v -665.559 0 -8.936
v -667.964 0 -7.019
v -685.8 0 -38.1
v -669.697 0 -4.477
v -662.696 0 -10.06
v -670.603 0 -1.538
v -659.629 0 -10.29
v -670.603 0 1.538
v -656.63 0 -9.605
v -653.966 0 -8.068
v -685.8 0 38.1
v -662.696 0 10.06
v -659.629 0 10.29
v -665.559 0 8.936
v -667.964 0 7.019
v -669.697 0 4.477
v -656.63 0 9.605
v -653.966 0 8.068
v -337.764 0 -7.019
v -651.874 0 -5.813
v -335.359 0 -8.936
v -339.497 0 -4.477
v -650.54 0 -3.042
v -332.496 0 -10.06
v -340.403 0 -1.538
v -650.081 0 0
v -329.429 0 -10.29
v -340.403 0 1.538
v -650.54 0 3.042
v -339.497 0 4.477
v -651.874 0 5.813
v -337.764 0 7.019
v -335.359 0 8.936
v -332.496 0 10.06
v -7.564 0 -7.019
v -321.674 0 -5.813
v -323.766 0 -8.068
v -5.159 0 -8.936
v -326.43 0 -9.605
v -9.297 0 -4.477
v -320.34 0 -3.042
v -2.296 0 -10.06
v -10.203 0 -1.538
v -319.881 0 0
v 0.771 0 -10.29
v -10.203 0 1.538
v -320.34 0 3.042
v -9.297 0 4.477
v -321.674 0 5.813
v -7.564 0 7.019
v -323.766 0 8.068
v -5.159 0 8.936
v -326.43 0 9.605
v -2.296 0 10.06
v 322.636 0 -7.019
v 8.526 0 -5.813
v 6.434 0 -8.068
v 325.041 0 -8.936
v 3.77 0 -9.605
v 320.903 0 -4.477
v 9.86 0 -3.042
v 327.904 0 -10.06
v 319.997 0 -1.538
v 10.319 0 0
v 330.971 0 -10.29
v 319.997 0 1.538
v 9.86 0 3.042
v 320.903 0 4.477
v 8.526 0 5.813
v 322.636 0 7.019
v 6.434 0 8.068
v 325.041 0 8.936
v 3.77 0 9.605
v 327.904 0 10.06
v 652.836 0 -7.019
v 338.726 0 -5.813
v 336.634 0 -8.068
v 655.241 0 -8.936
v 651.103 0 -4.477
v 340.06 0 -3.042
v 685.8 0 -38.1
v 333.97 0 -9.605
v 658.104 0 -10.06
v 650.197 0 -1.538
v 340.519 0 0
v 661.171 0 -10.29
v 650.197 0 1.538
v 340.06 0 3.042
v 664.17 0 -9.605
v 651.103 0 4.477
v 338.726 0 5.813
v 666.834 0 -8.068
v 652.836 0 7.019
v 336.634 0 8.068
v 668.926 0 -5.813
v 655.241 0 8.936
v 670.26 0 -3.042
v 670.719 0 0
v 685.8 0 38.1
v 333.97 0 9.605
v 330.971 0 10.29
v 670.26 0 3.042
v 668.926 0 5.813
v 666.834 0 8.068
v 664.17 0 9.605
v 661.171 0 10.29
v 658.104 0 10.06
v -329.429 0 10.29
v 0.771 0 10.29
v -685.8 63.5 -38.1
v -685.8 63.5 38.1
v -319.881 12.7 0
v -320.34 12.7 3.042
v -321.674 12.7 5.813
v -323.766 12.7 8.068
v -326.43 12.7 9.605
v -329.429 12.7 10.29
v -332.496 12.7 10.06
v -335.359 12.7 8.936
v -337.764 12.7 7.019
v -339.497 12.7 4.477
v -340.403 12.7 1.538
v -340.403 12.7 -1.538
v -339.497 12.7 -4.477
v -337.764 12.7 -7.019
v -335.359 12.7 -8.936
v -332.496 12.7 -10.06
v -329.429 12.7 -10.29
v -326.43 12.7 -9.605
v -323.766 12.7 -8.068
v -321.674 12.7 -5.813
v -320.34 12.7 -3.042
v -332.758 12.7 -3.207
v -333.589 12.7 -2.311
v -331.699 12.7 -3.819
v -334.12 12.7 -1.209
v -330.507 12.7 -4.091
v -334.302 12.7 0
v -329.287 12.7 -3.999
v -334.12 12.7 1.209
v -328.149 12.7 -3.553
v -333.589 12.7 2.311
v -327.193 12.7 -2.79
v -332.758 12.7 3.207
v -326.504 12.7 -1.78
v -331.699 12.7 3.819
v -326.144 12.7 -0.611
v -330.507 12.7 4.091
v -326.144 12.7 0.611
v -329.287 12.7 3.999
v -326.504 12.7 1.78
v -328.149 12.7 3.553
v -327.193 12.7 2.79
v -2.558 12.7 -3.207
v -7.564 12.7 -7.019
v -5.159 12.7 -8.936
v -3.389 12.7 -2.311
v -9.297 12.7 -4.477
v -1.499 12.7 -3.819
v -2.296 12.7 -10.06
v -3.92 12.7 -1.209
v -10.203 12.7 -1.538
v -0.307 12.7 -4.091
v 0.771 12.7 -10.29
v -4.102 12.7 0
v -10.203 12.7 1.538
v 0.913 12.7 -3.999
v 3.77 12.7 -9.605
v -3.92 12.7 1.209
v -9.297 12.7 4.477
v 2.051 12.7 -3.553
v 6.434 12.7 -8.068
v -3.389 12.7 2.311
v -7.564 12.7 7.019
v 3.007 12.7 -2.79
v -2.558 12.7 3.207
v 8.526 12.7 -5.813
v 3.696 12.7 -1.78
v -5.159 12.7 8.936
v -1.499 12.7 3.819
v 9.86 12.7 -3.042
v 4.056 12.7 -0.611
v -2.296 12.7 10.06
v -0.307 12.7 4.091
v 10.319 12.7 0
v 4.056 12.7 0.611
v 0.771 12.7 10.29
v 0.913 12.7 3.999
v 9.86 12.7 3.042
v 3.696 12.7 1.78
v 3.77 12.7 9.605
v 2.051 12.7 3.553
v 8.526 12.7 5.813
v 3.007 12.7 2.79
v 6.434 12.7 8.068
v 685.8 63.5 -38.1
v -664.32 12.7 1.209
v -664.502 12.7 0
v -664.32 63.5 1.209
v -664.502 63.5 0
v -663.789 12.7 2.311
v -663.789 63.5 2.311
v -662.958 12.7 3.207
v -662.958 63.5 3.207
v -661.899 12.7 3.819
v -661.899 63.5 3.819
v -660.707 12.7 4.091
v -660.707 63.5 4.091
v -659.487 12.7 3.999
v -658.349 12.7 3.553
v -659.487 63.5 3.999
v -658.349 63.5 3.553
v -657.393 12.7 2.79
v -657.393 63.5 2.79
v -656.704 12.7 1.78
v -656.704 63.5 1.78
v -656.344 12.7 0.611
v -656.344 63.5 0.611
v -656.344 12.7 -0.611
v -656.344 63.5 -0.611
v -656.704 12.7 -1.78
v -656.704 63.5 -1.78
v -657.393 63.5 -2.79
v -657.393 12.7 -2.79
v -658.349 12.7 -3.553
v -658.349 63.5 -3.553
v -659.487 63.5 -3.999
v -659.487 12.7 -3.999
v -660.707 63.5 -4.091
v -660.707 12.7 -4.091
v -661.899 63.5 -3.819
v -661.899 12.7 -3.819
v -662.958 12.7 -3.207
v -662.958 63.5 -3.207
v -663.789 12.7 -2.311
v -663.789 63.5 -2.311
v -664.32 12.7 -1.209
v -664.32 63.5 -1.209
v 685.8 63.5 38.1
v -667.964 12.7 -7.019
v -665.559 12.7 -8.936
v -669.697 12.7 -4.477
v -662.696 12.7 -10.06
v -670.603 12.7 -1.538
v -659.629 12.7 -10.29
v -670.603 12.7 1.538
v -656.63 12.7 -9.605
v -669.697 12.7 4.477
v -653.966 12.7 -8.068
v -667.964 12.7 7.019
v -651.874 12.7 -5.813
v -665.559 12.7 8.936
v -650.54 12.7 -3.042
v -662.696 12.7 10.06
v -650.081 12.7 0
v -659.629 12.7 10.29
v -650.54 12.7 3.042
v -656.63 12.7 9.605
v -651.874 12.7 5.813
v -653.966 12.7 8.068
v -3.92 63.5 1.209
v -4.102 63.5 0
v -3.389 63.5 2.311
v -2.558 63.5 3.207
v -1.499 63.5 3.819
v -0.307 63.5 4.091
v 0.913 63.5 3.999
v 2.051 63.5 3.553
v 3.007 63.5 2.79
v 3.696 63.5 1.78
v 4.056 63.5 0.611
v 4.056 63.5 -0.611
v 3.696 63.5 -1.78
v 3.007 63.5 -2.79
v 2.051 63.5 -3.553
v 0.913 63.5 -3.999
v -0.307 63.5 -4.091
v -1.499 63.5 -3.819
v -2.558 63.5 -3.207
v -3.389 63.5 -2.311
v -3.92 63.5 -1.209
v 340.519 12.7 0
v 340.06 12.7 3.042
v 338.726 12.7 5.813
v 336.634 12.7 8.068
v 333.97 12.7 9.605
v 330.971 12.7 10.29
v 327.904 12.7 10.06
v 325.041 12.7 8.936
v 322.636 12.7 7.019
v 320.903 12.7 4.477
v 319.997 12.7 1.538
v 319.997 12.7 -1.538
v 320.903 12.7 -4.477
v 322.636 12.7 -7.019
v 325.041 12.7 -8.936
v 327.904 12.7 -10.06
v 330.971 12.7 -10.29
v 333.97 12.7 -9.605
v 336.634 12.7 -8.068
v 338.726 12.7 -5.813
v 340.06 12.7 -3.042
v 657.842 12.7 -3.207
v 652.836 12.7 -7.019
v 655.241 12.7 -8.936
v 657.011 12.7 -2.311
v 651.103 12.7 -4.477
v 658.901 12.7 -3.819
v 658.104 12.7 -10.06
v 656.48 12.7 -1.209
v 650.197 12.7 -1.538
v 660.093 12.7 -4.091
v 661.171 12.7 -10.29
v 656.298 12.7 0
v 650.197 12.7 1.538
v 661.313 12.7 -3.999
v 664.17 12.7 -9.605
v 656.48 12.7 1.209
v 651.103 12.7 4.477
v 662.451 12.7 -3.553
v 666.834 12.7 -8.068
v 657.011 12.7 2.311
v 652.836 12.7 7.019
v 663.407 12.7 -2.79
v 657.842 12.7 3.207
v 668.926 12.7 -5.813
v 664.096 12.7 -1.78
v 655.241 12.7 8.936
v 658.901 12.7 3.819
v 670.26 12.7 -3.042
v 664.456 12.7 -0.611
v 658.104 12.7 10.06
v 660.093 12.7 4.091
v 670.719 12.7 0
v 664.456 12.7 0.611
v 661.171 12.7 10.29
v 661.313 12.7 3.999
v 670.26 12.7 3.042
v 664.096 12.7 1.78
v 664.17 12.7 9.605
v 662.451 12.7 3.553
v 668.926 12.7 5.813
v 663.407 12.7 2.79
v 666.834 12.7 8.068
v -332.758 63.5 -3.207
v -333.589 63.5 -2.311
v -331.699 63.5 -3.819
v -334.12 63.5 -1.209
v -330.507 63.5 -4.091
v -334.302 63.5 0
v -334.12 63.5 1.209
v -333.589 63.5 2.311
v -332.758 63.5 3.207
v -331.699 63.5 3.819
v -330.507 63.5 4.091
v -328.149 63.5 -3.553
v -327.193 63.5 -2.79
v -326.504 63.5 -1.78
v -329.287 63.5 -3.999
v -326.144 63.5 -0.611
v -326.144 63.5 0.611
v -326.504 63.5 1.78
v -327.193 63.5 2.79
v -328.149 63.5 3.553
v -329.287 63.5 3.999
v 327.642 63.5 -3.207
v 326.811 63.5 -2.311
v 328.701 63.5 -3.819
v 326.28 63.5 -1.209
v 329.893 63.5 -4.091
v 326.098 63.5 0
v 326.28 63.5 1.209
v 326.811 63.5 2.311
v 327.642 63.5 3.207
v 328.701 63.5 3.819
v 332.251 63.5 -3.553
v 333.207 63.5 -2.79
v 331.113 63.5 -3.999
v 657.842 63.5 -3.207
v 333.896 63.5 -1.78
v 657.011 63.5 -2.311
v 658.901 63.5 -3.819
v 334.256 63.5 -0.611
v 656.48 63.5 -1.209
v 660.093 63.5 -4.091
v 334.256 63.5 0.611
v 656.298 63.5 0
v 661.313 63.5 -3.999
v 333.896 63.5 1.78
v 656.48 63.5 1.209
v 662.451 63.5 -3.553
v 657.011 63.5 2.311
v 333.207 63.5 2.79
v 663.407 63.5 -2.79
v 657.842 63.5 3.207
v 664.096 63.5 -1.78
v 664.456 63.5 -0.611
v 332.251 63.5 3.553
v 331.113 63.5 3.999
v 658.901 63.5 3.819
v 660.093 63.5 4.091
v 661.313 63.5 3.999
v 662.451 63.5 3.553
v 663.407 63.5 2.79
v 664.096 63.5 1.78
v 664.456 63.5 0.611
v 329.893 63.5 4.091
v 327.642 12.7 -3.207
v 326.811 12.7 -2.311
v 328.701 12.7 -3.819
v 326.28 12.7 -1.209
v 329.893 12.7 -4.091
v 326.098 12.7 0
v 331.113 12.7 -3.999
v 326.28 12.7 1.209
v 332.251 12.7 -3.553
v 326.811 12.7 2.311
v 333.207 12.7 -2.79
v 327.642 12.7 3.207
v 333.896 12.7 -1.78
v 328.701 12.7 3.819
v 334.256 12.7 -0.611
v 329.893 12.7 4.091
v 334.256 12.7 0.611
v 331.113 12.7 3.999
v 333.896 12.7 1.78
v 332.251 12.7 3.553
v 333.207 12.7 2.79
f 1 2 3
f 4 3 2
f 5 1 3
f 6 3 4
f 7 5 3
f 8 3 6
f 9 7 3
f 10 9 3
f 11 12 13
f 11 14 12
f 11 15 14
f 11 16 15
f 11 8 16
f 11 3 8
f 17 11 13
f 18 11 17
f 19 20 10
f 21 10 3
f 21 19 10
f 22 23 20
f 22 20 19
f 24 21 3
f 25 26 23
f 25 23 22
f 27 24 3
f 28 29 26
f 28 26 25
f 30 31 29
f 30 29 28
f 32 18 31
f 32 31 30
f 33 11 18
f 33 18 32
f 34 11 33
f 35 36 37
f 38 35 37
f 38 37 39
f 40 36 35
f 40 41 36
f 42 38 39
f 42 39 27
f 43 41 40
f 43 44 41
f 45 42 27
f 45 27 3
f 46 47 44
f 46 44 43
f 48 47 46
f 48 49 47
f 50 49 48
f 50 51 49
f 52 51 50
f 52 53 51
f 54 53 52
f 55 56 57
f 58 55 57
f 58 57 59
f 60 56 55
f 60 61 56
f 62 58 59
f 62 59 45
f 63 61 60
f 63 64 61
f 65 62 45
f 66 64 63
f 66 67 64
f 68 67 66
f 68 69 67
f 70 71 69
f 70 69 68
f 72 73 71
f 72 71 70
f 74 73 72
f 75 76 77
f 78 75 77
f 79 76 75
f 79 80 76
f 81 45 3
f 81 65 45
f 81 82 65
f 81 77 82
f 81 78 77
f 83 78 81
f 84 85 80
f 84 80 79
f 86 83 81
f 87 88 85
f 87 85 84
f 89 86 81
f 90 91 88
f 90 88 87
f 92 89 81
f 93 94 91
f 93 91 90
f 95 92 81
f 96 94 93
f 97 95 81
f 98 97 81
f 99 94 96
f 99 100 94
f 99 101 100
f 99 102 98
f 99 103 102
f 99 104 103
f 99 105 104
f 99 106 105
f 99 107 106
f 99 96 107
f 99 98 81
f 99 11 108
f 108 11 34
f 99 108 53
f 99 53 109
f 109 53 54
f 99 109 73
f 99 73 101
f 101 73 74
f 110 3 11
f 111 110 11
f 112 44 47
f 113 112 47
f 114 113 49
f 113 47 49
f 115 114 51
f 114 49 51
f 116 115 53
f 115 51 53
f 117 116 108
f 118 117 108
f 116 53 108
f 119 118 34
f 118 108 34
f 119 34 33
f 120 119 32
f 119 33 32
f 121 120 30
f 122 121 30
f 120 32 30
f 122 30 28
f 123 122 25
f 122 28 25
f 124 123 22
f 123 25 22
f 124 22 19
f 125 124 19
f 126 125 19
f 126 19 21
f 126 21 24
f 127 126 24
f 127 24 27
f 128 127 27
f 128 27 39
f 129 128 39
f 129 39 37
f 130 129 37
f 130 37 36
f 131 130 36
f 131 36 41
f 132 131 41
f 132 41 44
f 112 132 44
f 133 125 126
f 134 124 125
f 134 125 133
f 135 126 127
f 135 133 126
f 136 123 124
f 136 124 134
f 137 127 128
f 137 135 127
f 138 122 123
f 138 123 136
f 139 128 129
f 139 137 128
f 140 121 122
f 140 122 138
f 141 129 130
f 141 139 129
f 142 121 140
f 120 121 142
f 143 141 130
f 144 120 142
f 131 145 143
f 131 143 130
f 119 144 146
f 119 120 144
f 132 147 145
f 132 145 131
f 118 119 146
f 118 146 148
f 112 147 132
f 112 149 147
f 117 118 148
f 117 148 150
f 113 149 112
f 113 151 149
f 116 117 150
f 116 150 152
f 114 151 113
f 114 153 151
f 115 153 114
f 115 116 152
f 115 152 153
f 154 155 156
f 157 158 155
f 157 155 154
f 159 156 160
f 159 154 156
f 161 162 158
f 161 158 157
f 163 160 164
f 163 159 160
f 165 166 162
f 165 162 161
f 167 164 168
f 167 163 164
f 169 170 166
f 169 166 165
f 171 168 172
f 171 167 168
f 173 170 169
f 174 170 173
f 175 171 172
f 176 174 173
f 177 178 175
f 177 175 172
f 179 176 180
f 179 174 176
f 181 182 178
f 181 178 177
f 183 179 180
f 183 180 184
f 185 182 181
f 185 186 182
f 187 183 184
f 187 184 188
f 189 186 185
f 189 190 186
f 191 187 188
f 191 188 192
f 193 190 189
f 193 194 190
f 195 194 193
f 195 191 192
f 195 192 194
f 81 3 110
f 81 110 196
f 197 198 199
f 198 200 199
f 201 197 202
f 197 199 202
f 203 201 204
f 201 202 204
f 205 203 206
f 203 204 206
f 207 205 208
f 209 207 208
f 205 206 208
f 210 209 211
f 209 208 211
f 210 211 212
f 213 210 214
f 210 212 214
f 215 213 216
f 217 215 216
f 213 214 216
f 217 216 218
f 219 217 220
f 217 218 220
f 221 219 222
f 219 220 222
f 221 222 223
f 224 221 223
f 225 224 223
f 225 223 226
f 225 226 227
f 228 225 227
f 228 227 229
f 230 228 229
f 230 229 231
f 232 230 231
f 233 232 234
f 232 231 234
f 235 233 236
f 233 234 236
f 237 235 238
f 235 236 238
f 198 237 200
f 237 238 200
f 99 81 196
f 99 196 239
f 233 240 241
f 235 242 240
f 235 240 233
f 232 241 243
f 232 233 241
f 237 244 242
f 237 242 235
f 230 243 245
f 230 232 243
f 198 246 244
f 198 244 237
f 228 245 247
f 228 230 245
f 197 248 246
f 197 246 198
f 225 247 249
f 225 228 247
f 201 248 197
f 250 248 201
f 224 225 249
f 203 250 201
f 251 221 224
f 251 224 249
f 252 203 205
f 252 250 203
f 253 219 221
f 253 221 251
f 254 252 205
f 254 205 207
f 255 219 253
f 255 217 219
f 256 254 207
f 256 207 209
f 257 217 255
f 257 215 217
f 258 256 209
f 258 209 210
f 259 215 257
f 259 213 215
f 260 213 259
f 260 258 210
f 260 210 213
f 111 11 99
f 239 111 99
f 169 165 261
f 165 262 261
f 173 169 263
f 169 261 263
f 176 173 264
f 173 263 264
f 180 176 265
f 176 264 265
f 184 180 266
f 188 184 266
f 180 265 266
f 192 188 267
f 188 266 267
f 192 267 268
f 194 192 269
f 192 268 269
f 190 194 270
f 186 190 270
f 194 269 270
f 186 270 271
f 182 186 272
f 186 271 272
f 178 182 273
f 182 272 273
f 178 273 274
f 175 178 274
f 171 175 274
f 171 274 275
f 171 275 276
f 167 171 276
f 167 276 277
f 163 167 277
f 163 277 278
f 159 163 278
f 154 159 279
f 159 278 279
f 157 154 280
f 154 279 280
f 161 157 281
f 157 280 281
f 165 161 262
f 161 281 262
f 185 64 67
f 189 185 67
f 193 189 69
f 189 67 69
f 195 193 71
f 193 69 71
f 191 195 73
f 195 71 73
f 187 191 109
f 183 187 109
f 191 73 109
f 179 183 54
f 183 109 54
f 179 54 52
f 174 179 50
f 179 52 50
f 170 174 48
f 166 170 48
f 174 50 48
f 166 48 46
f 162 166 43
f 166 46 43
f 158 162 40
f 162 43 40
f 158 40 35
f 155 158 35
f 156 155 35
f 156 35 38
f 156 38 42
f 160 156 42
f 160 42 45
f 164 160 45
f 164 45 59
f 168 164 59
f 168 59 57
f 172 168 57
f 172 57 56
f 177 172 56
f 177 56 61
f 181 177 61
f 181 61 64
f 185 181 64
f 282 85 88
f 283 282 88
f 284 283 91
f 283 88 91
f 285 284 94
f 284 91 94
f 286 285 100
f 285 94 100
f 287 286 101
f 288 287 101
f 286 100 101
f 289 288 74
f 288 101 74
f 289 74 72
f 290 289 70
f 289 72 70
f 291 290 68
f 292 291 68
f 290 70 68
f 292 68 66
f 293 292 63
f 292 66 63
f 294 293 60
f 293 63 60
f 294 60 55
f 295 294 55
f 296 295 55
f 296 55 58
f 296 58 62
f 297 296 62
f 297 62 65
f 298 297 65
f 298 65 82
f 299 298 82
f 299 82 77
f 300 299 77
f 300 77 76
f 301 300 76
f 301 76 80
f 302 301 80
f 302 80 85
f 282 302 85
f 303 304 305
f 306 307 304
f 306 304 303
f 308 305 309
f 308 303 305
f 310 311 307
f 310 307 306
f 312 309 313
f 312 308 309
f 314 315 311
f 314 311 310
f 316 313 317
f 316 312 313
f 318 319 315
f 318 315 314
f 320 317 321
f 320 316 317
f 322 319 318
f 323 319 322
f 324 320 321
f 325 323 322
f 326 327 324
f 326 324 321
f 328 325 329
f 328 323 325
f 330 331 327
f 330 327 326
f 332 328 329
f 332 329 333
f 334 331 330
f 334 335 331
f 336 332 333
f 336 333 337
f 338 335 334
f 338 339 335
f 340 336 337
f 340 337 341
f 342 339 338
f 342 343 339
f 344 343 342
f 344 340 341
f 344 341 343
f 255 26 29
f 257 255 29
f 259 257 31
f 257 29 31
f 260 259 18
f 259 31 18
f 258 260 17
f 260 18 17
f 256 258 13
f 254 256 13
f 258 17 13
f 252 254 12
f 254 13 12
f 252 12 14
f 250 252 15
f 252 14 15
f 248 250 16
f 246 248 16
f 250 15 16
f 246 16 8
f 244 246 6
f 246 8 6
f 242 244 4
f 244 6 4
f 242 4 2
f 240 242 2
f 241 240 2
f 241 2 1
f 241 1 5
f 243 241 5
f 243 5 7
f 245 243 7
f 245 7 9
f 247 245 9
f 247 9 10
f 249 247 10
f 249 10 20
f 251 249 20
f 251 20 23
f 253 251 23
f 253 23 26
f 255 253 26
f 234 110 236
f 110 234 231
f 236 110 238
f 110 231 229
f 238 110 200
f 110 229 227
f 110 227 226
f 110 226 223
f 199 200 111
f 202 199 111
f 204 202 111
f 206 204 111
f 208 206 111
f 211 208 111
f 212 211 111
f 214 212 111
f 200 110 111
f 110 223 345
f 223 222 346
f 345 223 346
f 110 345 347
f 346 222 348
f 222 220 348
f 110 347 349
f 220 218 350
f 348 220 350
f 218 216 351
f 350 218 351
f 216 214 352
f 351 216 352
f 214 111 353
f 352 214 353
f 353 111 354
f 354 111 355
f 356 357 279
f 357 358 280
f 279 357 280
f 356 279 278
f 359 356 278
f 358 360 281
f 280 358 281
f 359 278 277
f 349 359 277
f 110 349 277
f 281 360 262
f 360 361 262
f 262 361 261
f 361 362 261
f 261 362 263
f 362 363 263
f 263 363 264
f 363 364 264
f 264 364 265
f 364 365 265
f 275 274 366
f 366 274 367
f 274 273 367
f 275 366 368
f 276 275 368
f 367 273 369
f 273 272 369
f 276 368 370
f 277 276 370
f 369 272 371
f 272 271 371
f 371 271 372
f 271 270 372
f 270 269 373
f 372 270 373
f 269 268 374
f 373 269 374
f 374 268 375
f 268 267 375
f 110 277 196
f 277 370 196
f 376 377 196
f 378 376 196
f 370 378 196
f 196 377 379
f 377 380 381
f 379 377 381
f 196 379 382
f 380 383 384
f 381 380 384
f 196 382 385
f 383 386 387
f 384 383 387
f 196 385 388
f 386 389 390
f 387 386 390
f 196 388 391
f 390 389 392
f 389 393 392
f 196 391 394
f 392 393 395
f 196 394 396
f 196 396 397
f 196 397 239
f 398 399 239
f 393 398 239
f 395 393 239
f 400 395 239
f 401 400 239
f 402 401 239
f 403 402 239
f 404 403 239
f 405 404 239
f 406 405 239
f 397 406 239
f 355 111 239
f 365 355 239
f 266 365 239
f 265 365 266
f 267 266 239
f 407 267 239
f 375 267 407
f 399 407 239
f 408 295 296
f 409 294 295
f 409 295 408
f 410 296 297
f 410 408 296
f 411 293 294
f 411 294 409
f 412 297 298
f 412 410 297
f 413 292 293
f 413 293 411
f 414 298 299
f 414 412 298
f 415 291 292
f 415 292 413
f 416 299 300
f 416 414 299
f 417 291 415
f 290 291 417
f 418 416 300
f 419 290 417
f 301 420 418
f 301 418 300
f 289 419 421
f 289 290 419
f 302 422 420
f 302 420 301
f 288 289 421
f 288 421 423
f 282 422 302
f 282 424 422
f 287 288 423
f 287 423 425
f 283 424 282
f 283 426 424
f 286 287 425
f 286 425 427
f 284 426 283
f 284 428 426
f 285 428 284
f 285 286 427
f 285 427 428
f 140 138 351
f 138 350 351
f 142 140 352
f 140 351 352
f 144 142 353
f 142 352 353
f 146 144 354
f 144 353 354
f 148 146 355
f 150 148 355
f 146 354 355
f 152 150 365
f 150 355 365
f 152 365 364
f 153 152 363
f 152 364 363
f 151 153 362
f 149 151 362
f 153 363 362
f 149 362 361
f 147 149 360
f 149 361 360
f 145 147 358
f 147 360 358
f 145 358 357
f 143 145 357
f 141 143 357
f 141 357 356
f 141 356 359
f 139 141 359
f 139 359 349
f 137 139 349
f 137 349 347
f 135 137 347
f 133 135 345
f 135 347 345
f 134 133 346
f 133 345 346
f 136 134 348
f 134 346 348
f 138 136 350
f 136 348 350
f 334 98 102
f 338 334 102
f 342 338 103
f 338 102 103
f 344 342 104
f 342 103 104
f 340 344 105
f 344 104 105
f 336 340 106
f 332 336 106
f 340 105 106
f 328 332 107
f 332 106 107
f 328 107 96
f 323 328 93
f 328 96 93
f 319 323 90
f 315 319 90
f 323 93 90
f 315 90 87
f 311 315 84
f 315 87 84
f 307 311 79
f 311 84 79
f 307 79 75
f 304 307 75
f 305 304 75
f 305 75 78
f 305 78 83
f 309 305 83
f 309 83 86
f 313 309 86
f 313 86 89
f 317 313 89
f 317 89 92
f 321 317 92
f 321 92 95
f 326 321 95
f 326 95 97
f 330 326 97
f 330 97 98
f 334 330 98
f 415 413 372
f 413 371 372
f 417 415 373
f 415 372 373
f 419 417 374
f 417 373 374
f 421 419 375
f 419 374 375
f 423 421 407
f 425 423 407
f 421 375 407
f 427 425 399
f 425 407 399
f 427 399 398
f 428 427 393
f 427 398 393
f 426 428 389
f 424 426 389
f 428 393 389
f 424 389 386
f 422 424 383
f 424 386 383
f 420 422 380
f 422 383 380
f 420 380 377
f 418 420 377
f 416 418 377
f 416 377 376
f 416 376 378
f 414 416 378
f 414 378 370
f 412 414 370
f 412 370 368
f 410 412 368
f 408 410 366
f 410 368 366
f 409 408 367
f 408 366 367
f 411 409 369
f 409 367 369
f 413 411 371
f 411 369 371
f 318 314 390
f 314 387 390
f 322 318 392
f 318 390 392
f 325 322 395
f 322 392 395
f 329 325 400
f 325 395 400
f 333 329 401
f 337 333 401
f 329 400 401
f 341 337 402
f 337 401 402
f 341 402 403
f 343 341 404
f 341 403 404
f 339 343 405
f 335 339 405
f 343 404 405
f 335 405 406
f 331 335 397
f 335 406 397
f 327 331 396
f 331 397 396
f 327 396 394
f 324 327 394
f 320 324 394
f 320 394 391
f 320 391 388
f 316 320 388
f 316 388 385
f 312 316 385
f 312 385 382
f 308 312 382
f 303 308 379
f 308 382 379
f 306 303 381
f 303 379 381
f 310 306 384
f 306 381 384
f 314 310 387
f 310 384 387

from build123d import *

# Parameters (mm, degrees)
F0_W           = 1371.6
F0_H           = 76.2
F1_DEPTH       = 63.5
F2_D           = 8.2042
F2_CBORE_D     = 20.6375
F2_CBORE_DEPTH = 12.7


with BuildPart() as f1:
    # F0 (on Front) → F1 (new body)
    with BuildSketch(Plane.XZ):
        Rectangle(F0_W, F0_H)
    extrude(amount=-F1_DEPTH)

    # F2 (through all)
    with Locations(Plane.XZ):
        with Locations((-660.4, 0), (-330.2, 0), (0, 0), (330.2, 0), (660.4, 0)):
            CounterBoreHole(F2_D / 2, F2_CBORE_D / 2, F2_CBORE_DEPTH)


solid = f1.part
